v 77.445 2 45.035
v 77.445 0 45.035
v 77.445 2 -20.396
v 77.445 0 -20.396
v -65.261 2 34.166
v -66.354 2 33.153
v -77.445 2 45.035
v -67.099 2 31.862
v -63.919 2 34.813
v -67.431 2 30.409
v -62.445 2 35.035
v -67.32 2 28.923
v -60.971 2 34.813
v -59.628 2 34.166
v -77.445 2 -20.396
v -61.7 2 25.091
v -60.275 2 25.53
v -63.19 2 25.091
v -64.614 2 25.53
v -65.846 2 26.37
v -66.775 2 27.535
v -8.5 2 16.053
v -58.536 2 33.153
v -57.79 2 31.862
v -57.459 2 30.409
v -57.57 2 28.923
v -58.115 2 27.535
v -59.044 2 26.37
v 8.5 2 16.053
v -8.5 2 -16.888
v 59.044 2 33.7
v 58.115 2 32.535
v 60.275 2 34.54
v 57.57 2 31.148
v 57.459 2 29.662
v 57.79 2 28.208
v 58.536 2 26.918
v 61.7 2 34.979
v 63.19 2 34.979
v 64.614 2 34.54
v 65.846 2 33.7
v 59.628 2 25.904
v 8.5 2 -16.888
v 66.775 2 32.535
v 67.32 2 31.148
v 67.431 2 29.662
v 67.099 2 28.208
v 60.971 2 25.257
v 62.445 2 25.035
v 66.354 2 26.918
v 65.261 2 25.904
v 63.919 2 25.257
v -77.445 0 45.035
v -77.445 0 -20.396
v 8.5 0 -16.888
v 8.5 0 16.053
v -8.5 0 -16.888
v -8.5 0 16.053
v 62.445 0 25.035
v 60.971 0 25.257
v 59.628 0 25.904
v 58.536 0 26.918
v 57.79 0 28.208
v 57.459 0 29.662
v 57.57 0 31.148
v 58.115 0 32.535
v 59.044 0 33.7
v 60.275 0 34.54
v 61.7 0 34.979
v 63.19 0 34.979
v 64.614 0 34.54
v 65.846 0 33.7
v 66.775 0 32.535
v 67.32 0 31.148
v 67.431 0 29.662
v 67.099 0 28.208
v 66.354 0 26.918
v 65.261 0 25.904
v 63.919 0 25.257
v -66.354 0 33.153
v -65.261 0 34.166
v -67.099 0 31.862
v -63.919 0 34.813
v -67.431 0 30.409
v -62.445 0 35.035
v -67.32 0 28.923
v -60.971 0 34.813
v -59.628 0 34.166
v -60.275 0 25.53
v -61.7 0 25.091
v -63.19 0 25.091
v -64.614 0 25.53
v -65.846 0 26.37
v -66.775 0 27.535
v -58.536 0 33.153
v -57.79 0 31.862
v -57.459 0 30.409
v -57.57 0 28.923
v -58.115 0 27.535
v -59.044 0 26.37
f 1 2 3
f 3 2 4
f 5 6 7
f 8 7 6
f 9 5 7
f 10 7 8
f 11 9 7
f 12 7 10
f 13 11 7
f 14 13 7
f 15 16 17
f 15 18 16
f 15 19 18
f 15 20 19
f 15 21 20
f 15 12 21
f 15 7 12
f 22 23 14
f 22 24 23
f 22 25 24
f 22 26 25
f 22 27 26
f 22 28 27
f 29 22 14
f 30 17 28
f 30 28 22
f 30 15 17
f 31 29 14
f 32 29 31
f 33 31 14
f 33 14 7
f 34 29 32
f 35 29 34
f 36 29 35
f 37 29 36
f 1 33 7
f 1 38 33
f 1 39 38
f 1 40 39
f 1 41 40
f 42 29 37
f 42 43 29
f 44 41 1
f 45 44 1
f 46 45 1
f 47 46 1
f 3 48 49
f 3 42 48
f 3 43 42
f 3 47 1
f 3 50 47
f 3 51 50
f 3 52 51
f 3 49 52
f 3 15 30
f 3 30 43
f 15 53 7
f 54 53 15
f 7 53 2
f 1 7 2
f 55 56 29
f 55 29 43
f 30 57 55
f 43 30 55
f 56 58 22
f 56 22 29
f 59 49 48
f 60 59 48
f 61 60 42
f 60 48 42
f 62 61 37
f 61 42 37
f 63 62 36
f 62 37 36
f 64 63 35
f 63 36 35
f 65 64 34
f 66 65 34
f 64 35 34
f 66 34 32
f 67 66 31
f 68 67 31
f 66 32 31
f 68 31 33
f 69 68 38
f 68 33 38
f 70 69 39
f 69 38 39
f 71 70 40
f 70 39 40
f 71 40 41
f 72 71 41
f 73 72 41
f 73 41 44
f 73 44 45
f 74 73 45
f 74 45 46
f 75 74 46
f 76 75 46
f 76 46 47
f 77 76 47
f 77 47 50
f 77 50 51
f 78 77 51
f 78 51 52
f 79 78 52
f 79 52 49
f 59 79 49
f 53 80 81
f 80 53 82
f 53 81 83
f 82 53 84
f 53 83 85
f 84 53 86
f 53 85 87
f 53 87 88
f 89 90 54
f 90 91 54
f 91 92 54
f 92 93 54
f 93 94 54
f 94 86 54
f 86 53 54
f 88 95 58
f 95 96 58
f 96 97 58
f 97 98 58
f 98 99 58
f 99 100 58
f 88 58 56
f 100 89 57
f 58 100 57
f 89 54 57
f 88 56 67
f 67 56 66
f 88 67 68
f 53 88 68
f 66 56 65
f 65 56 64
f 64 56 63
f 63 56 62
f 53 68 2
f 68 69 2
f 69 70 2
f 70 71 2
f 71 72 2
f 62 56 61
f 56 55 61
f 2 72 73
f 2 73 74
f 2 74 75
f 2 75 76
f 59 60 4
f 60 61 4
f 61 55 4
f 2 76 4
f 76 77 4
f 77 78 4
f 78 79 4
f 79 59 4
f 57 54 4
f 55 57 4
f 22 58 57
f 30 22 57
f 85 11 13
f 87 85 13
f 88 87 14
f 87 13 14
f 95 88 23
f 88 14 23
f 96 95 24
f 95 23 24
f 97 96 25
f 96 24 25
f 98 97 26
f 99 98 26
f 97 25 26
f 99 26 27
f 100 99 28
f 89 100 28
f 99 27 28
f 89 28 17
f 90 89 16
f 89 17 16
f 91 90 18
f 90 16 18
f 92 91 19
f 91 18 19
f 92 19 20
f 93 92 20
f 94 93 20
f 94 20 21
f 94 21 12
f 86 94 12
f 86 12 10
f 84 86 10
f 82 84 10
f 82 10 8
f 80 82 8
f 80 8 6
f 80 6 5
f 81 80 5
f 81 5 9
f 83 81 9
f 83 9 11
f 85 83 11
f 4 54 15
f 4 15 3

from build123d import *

# Parameters (mm, degrees)
SKETCH_1_W          = 154.889723794
SKETCH_1_H          = 65.431275614
SKETCH_1_W_2        = 17
SKETCH_1_H_2        = 32.940924084
EXTRUDE_1_DEPTH     = 2
SKETCH_2_R          = 5
CUT_EXTRUDE_2_DEPTH = 90.609556274


with BuildPart() as part:
    # Эскиз1 → Вытянуть1 (new body)
    with BuildSketch(Plane(origin=(0, 0, 0), x_dir=(1, 0, 0), z_dir=(0, 1, 0))):
        with Locations((0, -12.319525582)):
            Rectangle(SKETCH_1_W, SKETCH_1_H)
        with Locations((0, 0.417277171)):
            Rectangle(SKETCH_1_W_2, SKETCH_1_H_2, mode=Mode.SUBTRACT)
    extrude(amount=EXTRUDE_1_DEPTH)

    # Эскиз2 → Вытянуть2 (cut, through all)
    with BuildSketch(Plane(origin=(0, 2, 0), x_dir=(1, 0, 0), z_dir=(0, 1, 0))):
        with Locations(Location((-62.444861897, -30.035163389, 0), (0, 0, 270))):
            Circle(SKETCH_2_R)
        with Locations(Location((62.444861897, -30.035163389, 0), (0, 0, 90))):
            Circle(SKETCH_2_R)
    extrude(amount=-CUT_EXTRUDE_2_DEPTH, mode=Mode.SUBTRACT)


solid = part.part
